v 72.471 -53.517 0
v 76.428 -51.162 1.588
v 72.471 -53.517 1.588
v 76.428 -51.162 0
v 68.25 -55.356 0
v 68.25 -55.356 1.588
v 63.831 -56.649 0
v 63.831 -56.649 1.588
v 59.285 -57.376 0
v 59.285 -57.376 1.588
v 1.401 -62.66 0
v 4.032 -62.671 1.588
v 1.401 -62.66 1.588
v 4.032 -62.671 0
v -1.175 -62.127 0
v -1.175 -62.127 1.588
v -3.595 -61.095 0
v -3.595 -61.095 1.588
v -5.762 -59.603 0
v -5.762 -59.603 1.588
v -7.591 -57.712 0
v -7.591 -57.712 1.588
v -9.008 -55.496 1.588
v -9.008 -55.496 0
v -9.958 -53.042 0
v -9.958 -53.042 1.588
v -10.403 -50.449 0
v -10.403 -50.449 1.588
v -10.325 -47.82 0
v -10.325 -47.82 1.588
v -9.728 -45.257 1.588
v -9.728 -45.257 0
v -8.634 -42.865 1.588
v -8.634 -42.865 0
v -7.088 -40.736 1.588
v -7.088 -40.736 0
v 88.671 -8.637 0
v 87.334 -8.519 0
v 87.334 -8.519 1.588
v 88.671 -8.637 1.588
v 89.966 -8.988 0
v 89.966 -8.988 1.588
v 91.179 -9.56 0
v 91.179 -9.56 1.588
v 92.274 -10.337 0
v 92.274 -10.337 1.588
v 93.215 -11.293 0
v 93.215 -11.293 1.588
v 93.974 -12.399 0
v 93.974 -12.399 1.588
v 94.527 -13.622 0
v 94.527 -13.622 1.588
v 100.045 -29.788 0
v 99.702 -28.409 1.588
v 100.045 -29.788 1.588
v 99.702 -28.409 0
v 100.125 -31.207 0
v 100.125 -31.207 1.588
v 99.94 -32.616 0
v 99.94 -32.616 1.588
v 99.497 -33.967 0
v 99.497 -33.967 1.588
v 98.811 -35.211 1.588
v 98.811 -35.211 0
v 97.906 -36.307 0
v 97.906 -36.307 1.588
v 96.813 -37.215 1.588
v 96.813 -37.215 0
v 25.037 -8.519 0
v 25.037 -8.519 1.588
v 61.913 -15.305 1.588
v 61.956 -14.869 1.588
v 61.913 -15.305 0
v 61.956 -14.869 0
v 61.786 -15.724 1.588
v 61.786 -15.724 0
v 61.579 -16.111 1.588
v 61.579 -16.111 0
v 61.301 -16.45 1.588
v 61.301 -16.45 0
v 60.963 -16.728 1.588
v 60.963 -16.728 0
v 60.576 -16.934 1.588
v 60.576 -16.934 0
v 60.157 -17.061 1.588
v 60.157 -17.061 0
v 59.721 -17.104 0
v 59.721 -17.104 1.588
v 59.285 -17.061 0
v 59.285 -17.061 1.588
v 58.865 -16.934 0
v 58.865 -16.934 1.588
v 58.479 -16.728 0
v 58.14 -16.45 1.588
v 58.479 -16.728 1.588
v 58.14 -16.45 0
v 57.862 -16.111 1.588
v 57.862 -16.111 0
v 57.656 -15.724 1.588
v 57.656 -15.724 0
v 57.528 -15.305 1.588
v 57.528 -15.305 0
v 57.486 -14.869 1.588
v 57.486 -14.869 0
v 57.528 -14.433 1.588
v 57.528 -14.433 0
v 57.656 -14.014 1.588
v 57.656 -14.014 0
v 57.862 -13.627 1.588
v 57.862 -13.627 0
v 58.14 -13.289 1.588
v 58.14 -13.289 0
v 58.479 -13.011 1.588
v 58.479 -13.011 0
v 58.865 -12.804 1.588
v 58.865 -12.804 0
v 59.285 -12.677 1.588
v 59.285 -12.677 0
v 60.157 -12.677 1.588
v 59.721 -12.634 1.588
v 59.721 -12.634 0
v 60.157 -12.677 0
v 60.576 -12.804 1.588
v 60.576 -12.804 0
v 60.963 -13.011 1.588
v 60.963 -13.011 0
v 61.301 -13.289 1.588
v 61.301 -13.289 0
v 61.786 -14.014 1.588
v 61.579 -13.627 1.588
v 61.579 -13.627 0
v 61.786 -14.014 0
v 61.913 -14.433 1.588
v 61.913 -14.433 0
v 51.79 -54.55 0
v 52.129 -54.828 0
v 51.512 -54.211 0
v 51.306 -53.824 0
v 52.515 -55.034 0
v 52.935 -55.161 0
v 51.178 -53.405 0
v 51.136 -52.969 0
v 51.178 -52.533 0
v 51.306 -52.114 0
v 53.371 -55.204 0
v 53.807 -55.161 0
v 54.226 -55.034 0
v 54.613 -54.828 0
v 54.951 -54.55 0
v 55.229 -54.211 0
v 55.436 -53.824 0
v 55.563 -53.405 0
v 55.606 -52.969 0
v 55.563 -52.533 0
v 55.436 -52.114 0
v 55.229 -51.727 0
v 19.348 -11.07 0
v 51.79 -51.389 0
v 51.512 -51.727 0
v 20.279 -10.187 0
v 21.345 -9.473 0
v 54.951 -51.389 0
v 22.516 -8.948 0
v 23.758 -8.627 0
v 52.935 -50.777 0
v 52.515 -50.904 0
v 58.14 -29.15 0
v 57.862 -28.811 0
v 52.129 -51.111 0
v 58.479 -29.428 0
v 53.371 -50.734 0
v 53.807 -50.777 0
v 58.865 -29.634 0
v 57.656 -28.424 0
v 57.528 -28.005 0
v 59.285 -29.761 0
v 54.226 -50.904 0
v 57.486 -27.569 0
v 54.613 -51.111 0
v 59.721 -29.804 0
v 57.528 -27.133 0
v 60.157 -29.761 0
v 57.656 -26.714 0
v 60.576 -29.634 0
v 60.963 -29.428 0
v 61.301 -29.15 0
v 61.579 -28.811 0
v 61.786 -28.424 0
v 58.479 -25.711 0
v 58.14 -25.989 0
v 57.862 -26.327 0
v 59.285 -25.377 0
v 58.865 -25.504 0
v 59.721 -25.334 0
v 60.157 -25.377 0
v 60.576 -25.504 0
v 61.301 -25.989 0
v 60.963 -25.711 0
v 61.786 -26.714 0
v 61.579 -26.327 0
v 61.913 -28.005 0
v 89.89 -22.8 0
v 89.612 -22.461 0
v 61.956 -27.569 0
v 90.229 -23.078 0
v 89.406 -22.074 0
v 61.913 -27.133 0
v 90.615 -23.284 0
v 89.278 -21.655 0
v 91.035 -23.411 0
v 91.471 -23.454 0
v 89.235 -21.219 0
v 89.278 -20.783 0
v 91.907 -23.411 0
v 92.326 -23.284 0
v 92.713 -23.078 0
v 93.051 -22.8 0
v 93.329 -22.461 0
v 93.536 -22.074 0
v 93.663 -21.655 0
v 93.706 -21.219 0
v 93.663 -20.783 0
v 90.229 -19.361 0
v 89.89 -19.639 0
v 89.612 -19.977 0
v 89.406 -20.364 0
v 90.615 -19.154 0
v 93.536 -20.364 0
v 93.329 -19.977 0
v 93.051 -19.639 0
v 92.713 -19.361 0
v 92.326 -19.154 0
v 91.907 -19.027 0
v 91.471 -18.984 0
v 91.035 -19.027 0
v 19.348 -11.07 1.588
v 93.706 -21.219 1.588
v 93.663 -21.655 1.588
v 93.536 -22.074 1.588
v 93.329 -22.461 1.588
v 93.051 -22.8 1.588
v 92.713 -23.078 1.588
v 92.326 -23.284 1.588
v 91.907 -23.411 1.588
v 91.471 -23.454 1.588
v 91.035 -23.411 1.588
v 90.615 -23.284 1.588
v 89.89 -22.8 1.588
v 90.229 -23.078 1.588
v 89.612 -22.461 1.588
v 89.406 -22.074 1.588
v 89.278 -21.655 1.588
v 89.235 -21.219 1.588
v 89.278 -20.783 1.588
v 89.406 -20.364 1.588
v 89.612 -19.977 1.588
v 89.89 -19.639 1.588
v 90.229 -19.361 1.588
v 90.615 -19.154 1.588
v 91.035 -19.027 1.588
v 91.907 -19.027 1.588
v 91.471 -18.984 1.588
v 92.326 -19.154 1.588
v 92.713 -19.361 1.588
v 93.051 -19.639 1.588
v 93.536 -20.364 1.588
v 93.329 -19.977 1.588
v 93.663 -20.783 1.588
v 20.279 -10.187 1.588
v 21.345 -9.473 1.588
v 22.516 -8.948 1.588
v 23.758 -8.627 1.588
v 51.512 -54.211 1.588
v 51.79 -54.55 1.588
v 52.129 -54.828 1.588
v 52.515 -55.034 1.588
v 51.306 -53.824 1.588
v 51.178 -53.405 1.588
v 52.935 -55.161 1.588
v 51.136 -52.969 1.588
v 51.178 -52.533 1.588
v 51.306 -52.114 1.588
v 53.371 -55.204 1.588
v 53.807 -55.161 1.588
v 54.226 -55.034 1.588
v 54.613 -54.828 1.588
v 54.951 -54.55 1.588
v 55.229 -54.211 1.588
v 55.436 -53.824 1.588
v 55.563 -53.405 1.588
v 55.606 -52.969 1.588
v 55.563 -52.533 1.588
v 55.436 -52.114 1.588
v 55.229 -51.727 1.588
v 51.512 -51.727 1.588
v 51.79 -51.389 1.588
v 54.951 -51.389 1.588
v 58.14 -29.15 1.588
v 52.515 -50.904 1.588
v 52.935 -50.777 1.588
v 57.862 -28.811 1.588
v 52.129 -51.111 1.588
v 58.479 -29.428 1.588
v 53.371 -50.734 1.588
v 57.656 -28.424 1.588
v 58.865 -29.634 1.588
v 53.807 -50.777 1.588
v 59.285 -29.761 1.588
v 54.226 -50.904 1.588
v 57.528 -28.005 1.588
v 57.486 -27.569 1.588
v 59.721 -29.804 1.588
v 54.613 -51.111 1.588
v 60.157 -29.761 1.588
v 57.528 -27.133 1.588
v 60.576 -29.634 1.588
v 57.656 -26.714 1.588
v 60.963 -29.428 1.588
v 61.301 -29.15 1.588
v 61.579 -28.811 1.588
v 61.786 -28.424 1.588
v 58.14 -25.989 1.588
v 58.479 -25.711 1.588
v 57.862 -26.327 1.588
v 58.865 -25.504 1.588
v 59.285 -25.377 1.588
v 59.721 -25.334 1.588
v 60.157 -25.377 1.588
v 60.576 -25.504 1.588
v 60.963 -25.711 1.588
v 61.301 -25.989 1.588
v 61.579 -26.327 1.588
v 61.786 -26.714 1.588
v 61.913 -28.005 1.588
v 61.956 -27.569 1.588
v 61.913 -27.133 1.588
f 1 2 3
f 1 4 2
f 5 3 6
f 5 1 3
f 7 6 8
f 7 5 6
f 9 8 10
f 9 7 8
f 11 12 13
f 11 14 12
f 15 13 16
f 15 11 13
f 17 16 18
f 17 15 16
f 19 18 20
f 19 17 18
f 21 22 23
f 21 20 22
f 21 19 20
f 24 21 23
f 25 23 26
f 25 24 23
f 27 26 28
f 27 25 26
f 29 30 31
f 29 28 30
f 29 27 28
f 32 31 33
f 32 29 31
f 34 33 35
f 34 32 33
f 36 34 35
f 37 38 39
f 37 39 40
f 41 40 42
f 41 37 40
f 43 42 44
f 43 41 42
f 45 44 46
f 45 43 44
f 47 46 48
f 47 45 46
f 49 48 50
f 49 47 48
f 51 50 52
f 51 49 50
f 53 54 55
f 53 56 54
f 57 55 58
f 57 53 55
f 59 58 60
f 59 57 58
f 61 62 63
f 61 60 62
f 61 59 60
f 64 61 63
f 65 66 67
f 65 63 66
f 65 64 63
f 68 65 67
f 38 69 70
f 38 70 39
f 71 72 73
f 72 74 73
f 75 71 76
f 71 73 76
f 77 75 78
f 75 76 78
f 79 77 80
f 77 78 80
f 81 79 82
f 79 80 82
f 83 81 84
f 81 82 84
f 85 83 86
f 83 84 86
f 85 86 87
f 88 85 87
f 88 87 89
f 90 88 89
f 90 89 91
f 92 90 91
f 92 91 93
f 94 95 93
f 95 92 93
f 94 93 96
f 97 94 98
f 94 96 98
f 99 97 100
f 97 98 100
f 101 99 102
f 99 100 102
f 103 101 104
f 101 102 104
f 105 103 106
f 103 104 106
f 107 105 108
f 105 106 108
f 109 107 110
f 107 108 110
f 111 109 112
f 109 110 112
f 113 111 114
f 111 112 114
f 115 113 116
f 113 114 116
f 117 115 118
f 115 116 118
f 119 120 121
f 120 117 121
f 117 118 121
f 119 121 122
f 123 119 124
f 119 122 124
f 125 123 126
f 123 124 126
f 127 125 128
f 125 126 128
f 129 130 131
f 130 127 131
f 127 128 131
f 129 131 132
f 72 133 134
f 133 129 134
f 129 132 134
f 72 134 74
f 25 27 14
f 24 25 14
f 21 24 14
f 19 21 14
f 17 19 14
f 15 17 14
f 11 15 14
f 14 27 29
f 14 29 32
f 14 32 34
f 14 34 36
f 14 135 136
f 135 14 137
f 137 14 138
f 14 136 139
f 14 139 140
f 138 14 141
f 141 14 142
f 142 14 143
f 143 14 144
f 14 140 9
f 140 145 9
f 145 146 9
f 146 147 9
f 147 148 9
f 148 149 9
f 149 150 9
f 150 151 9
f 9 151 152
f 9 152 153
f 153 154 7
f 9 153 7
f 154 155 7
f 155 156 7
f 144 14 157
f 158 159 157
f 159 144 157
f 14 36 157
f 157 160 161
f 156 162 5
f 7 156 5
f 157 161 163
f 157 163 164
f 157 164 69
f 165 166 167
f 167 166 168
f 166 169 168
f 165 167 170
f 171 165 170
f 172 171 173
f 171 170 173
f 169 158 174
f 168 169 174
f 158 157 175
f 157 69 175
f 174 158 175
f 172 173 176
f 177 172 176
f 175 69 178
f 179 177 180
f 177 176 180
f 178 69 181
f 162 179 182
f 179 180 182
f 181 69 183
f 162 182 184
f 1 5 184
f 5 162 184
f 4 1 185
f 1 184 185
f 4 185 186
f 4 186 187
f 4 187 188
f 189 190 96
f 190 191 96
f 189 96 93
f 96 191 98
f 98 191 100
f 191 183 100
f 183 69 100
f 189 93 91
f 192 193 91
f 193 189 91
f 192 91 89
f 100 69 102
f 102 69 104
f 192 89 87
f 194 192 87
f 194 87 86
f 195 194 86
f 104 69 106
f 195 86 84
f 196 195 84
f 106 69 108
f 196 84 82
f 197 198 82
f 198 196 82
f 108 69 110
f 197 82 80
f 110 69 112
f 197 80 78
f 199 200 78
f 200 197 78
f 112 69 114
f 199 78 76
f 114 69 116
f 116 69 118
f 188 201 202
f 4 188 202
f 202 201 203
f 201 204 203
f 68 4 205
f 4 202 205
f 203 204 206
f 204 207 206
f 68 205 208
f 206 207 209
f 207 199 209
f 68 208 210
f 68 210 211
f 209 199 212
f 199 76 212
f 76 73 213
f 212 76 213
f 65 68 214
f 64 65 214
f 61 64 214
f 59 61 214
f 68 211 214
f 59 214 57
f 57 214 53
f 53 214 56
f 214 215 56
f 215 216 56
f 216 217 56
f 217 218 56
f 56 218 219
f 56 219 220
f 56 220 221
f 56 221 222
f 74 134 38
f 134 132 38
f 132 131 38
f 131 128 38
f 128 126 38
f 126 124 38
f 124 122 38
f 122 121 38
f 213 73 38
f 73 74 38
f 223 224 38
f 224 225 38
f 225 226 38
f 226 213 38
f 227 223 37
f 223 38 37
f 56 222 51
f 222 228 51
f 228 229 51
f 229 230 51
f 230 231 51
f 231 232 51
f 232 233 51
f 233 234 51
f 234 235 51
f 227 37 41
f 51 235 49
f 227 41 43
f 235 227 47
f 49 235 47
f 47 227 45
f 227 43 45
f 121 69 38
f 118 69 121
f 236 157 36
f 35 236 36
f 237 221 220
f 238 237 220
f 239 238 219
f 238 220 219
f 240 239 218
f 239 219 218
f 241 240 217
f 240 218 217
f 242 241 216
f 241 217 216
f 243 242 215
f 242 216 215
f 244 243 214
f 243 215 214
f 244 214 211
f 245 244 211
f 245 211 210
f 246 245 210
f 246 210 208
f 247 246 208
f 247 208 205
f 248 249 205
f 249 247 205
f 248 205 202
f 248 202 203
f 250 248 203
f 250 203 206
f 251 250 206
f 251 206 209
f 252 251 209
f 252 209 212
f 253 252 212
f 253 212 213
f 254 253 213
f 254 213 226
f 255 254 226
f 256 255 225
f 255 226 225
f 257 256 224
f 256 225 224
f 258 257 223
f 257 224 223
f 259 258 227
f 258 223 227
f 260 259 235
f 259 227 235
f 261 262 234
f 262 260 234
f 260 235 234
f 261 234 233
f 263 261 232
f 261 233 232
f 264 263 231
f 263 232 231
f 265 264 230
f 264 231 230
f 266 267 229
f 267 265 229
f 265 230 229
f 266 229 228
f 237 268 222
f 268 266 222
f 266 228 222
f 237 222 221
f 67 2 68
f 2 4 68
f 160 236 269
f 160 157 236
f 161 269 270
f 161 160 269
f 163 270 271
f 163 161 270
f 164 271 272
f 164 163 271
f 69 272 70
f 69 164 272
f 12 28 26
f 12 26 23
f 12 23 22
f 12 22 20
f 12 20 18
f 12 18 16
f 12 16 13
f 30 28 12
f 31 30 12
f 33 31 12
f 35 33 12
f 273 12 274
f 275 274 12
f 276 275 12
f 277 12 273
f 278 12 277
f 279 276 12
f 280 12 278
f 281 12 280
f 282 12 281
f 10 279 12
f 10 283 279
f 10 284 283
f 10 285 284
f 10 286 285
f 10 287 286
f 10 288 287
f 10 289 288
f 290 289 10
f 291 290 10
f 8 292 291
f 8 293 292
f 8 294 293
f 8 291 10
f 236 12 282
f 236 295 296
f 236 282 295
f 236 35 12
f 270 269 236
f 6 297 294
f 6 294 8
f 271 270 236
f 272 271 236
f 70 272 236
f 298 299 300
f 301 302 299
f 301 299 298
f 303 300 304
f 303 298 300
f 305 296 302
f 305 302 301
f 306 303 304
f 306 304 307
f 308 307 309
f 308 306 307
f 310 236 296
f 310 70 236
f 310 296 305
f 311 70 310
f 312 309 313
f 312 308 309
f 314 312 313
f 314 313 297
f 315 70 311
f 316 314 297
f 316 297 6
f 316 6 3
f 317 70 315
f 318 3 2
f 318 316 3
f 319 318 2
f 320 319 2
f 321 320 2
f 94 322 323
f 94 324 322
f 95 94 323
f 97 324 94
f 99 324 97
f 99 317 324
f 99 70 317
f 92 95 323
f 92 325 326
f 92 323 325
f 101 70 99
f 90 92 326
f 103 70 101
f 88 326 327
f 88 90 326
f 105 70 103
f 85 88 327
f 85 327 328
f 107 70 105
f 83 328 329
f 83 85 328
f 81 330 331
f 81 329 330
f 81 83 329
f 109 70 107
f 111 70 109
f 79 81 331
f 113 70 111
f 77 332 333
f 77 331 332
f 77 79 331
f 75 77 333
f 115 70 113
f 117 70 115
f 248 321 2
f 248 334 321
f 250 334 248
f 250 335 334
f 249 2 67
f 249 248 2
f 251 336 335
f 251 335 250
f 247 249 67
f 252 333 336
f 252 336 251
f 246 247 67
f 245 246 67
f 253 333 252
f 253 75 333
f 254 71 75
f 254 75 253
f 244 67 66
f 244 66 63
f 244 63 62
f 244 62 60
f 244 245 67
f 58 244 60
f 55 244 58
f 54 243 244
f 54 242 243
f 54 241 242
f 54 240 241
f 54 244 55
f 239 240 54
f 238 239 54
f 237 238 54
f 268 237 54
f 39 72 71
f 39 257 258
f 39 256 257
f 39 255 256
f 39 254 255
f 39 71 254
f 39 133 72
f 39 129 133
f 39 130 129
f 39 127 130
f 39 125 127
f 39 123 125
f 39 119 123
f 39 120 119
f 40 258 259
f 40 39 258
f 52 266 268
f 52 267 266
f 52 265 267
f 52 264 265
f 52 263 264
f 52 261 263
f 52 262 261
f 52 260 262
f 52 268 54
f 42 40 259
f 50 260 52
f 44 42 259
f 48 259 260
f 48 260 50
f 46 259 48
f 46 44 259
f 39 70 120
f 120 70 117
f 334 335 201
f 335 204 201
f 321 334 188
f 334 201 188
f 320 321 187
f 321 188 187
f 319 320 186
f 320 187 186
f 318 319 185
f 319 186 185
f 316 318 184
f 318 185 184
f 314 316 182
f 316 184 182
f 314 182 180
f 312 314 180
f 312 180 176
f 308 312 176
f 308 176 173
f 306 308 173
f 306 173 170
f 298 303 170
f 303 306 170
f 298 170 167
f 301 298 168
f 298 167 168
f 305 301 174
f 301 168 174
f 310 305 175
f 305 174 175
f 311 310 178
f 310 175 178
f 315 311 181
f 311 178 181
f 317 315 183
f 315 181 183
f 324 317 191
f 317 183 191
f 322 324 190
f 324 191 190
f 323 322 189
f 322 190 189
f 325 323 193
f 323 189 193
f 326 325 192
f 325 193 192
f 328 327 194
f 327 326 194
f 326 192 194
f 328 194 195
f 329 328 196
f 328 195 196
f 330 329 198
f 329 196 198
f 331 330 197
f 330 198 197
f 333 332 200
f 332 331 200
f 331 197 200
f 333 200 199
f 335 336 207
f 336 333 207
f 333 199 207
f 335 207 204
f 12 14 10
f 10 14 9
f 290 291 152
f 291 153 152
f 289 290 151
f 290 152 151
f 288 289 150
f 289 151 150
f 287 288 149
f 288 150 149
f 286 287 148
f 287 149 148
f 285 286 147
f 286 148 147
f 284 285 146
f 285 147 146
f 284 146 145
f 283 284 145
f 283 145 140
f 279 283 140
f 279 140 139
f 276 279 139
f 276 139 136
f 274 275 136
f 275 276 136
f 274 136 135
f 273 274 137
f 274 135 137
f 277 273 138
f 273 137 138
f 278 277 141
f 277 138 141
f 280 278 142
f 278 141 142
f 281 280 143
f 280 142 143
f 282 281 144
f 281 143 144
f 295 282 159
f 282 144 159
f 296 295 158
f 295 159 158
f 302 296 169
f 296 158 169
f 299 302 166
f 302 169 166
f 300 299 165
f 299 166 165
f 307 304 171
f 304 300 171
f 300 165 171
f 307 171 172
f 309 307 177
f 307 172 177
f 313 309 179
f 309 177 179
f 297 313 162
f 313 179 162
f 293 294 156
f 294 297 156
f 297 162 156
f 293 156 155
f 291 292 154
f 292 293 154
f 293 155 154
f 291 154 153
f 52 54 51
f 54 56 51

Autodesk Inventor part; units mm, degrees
ref_plane "YZ Plane" through (0, 0, 0) normal (1, 0, 0) x (0, 1, 0)
ref_plane "XZ Plane" through (0, 0, 0) normal (0, 1, 0) x (-1, 0, 0)
ref_plane "XY Plane" through (0, 0, 0) normal (0, 0, 1) x (1, 0, 0)
sketch "Sketch1" plane through (0, 0, 0) normal (0, 0, 1) x (1, 0, 0)
  circle A0 centre (53.3707, -52.9691) radius 2.2352
  arc A1 (-7.0885, -40.7359) -> (4.0322, -62.6709) centre (2.7723, -49.5231) ccw
  arc A2 (94.5267, -13.6218) -> (87.3345, -8.5191) centre (87.3345, -16.1391) ccw
  line L0 (25.0369, -8.5191) -> (87.3345, -8.5191)
  arc A3 (96.8127, -37.2153) -> (99.7022, -28.4091) centre (92.51, -30.9263) ccw
  line L1 (99.7022, -28.4091) -> (94.5267, -13.6218)
  arc A4 (59.2846, -57.3763) -> (76.4278, -51.1618) centre (55.7999, -21.0109) ccw
  arc A5 (25.0369, -8.5191) -> (19.348, -11.0695) centre (25.0369, -16.1391) ccw
  circle A6 centre (59.7207, -27.5691) radius 2.2352
  circle A7 centre (91.4707, -21.2191) radius 2.2352
  circle A8 centre (59.7207, -14.8691) radius 2.2352
  line L2 (76.4278, -51.1618) -> (96.8127, -37.2153)
  line L3 (19.348, -11.0695) -> (-7.0885, -40.7359)
  line L4 (4.0322, -62.6709) -> (59.2846, -57.3763)
  point P0 (0, 0)
  point P1 (19.348, -11.0695)
  point P2 (-7.0885, -40.7359)
  point P3 (4.0322, -62.6709)
  point P4 (59.2846, -57.3763)
  point P5 (76.4278, -51.1618)
  point P6 (94.5267, -13.6218)
  point P7 (87.3345, -8.5191)
extrude "Extrusion1" add sketch "Sketch1" along normal blind 1.5875
properties part number "neil"
